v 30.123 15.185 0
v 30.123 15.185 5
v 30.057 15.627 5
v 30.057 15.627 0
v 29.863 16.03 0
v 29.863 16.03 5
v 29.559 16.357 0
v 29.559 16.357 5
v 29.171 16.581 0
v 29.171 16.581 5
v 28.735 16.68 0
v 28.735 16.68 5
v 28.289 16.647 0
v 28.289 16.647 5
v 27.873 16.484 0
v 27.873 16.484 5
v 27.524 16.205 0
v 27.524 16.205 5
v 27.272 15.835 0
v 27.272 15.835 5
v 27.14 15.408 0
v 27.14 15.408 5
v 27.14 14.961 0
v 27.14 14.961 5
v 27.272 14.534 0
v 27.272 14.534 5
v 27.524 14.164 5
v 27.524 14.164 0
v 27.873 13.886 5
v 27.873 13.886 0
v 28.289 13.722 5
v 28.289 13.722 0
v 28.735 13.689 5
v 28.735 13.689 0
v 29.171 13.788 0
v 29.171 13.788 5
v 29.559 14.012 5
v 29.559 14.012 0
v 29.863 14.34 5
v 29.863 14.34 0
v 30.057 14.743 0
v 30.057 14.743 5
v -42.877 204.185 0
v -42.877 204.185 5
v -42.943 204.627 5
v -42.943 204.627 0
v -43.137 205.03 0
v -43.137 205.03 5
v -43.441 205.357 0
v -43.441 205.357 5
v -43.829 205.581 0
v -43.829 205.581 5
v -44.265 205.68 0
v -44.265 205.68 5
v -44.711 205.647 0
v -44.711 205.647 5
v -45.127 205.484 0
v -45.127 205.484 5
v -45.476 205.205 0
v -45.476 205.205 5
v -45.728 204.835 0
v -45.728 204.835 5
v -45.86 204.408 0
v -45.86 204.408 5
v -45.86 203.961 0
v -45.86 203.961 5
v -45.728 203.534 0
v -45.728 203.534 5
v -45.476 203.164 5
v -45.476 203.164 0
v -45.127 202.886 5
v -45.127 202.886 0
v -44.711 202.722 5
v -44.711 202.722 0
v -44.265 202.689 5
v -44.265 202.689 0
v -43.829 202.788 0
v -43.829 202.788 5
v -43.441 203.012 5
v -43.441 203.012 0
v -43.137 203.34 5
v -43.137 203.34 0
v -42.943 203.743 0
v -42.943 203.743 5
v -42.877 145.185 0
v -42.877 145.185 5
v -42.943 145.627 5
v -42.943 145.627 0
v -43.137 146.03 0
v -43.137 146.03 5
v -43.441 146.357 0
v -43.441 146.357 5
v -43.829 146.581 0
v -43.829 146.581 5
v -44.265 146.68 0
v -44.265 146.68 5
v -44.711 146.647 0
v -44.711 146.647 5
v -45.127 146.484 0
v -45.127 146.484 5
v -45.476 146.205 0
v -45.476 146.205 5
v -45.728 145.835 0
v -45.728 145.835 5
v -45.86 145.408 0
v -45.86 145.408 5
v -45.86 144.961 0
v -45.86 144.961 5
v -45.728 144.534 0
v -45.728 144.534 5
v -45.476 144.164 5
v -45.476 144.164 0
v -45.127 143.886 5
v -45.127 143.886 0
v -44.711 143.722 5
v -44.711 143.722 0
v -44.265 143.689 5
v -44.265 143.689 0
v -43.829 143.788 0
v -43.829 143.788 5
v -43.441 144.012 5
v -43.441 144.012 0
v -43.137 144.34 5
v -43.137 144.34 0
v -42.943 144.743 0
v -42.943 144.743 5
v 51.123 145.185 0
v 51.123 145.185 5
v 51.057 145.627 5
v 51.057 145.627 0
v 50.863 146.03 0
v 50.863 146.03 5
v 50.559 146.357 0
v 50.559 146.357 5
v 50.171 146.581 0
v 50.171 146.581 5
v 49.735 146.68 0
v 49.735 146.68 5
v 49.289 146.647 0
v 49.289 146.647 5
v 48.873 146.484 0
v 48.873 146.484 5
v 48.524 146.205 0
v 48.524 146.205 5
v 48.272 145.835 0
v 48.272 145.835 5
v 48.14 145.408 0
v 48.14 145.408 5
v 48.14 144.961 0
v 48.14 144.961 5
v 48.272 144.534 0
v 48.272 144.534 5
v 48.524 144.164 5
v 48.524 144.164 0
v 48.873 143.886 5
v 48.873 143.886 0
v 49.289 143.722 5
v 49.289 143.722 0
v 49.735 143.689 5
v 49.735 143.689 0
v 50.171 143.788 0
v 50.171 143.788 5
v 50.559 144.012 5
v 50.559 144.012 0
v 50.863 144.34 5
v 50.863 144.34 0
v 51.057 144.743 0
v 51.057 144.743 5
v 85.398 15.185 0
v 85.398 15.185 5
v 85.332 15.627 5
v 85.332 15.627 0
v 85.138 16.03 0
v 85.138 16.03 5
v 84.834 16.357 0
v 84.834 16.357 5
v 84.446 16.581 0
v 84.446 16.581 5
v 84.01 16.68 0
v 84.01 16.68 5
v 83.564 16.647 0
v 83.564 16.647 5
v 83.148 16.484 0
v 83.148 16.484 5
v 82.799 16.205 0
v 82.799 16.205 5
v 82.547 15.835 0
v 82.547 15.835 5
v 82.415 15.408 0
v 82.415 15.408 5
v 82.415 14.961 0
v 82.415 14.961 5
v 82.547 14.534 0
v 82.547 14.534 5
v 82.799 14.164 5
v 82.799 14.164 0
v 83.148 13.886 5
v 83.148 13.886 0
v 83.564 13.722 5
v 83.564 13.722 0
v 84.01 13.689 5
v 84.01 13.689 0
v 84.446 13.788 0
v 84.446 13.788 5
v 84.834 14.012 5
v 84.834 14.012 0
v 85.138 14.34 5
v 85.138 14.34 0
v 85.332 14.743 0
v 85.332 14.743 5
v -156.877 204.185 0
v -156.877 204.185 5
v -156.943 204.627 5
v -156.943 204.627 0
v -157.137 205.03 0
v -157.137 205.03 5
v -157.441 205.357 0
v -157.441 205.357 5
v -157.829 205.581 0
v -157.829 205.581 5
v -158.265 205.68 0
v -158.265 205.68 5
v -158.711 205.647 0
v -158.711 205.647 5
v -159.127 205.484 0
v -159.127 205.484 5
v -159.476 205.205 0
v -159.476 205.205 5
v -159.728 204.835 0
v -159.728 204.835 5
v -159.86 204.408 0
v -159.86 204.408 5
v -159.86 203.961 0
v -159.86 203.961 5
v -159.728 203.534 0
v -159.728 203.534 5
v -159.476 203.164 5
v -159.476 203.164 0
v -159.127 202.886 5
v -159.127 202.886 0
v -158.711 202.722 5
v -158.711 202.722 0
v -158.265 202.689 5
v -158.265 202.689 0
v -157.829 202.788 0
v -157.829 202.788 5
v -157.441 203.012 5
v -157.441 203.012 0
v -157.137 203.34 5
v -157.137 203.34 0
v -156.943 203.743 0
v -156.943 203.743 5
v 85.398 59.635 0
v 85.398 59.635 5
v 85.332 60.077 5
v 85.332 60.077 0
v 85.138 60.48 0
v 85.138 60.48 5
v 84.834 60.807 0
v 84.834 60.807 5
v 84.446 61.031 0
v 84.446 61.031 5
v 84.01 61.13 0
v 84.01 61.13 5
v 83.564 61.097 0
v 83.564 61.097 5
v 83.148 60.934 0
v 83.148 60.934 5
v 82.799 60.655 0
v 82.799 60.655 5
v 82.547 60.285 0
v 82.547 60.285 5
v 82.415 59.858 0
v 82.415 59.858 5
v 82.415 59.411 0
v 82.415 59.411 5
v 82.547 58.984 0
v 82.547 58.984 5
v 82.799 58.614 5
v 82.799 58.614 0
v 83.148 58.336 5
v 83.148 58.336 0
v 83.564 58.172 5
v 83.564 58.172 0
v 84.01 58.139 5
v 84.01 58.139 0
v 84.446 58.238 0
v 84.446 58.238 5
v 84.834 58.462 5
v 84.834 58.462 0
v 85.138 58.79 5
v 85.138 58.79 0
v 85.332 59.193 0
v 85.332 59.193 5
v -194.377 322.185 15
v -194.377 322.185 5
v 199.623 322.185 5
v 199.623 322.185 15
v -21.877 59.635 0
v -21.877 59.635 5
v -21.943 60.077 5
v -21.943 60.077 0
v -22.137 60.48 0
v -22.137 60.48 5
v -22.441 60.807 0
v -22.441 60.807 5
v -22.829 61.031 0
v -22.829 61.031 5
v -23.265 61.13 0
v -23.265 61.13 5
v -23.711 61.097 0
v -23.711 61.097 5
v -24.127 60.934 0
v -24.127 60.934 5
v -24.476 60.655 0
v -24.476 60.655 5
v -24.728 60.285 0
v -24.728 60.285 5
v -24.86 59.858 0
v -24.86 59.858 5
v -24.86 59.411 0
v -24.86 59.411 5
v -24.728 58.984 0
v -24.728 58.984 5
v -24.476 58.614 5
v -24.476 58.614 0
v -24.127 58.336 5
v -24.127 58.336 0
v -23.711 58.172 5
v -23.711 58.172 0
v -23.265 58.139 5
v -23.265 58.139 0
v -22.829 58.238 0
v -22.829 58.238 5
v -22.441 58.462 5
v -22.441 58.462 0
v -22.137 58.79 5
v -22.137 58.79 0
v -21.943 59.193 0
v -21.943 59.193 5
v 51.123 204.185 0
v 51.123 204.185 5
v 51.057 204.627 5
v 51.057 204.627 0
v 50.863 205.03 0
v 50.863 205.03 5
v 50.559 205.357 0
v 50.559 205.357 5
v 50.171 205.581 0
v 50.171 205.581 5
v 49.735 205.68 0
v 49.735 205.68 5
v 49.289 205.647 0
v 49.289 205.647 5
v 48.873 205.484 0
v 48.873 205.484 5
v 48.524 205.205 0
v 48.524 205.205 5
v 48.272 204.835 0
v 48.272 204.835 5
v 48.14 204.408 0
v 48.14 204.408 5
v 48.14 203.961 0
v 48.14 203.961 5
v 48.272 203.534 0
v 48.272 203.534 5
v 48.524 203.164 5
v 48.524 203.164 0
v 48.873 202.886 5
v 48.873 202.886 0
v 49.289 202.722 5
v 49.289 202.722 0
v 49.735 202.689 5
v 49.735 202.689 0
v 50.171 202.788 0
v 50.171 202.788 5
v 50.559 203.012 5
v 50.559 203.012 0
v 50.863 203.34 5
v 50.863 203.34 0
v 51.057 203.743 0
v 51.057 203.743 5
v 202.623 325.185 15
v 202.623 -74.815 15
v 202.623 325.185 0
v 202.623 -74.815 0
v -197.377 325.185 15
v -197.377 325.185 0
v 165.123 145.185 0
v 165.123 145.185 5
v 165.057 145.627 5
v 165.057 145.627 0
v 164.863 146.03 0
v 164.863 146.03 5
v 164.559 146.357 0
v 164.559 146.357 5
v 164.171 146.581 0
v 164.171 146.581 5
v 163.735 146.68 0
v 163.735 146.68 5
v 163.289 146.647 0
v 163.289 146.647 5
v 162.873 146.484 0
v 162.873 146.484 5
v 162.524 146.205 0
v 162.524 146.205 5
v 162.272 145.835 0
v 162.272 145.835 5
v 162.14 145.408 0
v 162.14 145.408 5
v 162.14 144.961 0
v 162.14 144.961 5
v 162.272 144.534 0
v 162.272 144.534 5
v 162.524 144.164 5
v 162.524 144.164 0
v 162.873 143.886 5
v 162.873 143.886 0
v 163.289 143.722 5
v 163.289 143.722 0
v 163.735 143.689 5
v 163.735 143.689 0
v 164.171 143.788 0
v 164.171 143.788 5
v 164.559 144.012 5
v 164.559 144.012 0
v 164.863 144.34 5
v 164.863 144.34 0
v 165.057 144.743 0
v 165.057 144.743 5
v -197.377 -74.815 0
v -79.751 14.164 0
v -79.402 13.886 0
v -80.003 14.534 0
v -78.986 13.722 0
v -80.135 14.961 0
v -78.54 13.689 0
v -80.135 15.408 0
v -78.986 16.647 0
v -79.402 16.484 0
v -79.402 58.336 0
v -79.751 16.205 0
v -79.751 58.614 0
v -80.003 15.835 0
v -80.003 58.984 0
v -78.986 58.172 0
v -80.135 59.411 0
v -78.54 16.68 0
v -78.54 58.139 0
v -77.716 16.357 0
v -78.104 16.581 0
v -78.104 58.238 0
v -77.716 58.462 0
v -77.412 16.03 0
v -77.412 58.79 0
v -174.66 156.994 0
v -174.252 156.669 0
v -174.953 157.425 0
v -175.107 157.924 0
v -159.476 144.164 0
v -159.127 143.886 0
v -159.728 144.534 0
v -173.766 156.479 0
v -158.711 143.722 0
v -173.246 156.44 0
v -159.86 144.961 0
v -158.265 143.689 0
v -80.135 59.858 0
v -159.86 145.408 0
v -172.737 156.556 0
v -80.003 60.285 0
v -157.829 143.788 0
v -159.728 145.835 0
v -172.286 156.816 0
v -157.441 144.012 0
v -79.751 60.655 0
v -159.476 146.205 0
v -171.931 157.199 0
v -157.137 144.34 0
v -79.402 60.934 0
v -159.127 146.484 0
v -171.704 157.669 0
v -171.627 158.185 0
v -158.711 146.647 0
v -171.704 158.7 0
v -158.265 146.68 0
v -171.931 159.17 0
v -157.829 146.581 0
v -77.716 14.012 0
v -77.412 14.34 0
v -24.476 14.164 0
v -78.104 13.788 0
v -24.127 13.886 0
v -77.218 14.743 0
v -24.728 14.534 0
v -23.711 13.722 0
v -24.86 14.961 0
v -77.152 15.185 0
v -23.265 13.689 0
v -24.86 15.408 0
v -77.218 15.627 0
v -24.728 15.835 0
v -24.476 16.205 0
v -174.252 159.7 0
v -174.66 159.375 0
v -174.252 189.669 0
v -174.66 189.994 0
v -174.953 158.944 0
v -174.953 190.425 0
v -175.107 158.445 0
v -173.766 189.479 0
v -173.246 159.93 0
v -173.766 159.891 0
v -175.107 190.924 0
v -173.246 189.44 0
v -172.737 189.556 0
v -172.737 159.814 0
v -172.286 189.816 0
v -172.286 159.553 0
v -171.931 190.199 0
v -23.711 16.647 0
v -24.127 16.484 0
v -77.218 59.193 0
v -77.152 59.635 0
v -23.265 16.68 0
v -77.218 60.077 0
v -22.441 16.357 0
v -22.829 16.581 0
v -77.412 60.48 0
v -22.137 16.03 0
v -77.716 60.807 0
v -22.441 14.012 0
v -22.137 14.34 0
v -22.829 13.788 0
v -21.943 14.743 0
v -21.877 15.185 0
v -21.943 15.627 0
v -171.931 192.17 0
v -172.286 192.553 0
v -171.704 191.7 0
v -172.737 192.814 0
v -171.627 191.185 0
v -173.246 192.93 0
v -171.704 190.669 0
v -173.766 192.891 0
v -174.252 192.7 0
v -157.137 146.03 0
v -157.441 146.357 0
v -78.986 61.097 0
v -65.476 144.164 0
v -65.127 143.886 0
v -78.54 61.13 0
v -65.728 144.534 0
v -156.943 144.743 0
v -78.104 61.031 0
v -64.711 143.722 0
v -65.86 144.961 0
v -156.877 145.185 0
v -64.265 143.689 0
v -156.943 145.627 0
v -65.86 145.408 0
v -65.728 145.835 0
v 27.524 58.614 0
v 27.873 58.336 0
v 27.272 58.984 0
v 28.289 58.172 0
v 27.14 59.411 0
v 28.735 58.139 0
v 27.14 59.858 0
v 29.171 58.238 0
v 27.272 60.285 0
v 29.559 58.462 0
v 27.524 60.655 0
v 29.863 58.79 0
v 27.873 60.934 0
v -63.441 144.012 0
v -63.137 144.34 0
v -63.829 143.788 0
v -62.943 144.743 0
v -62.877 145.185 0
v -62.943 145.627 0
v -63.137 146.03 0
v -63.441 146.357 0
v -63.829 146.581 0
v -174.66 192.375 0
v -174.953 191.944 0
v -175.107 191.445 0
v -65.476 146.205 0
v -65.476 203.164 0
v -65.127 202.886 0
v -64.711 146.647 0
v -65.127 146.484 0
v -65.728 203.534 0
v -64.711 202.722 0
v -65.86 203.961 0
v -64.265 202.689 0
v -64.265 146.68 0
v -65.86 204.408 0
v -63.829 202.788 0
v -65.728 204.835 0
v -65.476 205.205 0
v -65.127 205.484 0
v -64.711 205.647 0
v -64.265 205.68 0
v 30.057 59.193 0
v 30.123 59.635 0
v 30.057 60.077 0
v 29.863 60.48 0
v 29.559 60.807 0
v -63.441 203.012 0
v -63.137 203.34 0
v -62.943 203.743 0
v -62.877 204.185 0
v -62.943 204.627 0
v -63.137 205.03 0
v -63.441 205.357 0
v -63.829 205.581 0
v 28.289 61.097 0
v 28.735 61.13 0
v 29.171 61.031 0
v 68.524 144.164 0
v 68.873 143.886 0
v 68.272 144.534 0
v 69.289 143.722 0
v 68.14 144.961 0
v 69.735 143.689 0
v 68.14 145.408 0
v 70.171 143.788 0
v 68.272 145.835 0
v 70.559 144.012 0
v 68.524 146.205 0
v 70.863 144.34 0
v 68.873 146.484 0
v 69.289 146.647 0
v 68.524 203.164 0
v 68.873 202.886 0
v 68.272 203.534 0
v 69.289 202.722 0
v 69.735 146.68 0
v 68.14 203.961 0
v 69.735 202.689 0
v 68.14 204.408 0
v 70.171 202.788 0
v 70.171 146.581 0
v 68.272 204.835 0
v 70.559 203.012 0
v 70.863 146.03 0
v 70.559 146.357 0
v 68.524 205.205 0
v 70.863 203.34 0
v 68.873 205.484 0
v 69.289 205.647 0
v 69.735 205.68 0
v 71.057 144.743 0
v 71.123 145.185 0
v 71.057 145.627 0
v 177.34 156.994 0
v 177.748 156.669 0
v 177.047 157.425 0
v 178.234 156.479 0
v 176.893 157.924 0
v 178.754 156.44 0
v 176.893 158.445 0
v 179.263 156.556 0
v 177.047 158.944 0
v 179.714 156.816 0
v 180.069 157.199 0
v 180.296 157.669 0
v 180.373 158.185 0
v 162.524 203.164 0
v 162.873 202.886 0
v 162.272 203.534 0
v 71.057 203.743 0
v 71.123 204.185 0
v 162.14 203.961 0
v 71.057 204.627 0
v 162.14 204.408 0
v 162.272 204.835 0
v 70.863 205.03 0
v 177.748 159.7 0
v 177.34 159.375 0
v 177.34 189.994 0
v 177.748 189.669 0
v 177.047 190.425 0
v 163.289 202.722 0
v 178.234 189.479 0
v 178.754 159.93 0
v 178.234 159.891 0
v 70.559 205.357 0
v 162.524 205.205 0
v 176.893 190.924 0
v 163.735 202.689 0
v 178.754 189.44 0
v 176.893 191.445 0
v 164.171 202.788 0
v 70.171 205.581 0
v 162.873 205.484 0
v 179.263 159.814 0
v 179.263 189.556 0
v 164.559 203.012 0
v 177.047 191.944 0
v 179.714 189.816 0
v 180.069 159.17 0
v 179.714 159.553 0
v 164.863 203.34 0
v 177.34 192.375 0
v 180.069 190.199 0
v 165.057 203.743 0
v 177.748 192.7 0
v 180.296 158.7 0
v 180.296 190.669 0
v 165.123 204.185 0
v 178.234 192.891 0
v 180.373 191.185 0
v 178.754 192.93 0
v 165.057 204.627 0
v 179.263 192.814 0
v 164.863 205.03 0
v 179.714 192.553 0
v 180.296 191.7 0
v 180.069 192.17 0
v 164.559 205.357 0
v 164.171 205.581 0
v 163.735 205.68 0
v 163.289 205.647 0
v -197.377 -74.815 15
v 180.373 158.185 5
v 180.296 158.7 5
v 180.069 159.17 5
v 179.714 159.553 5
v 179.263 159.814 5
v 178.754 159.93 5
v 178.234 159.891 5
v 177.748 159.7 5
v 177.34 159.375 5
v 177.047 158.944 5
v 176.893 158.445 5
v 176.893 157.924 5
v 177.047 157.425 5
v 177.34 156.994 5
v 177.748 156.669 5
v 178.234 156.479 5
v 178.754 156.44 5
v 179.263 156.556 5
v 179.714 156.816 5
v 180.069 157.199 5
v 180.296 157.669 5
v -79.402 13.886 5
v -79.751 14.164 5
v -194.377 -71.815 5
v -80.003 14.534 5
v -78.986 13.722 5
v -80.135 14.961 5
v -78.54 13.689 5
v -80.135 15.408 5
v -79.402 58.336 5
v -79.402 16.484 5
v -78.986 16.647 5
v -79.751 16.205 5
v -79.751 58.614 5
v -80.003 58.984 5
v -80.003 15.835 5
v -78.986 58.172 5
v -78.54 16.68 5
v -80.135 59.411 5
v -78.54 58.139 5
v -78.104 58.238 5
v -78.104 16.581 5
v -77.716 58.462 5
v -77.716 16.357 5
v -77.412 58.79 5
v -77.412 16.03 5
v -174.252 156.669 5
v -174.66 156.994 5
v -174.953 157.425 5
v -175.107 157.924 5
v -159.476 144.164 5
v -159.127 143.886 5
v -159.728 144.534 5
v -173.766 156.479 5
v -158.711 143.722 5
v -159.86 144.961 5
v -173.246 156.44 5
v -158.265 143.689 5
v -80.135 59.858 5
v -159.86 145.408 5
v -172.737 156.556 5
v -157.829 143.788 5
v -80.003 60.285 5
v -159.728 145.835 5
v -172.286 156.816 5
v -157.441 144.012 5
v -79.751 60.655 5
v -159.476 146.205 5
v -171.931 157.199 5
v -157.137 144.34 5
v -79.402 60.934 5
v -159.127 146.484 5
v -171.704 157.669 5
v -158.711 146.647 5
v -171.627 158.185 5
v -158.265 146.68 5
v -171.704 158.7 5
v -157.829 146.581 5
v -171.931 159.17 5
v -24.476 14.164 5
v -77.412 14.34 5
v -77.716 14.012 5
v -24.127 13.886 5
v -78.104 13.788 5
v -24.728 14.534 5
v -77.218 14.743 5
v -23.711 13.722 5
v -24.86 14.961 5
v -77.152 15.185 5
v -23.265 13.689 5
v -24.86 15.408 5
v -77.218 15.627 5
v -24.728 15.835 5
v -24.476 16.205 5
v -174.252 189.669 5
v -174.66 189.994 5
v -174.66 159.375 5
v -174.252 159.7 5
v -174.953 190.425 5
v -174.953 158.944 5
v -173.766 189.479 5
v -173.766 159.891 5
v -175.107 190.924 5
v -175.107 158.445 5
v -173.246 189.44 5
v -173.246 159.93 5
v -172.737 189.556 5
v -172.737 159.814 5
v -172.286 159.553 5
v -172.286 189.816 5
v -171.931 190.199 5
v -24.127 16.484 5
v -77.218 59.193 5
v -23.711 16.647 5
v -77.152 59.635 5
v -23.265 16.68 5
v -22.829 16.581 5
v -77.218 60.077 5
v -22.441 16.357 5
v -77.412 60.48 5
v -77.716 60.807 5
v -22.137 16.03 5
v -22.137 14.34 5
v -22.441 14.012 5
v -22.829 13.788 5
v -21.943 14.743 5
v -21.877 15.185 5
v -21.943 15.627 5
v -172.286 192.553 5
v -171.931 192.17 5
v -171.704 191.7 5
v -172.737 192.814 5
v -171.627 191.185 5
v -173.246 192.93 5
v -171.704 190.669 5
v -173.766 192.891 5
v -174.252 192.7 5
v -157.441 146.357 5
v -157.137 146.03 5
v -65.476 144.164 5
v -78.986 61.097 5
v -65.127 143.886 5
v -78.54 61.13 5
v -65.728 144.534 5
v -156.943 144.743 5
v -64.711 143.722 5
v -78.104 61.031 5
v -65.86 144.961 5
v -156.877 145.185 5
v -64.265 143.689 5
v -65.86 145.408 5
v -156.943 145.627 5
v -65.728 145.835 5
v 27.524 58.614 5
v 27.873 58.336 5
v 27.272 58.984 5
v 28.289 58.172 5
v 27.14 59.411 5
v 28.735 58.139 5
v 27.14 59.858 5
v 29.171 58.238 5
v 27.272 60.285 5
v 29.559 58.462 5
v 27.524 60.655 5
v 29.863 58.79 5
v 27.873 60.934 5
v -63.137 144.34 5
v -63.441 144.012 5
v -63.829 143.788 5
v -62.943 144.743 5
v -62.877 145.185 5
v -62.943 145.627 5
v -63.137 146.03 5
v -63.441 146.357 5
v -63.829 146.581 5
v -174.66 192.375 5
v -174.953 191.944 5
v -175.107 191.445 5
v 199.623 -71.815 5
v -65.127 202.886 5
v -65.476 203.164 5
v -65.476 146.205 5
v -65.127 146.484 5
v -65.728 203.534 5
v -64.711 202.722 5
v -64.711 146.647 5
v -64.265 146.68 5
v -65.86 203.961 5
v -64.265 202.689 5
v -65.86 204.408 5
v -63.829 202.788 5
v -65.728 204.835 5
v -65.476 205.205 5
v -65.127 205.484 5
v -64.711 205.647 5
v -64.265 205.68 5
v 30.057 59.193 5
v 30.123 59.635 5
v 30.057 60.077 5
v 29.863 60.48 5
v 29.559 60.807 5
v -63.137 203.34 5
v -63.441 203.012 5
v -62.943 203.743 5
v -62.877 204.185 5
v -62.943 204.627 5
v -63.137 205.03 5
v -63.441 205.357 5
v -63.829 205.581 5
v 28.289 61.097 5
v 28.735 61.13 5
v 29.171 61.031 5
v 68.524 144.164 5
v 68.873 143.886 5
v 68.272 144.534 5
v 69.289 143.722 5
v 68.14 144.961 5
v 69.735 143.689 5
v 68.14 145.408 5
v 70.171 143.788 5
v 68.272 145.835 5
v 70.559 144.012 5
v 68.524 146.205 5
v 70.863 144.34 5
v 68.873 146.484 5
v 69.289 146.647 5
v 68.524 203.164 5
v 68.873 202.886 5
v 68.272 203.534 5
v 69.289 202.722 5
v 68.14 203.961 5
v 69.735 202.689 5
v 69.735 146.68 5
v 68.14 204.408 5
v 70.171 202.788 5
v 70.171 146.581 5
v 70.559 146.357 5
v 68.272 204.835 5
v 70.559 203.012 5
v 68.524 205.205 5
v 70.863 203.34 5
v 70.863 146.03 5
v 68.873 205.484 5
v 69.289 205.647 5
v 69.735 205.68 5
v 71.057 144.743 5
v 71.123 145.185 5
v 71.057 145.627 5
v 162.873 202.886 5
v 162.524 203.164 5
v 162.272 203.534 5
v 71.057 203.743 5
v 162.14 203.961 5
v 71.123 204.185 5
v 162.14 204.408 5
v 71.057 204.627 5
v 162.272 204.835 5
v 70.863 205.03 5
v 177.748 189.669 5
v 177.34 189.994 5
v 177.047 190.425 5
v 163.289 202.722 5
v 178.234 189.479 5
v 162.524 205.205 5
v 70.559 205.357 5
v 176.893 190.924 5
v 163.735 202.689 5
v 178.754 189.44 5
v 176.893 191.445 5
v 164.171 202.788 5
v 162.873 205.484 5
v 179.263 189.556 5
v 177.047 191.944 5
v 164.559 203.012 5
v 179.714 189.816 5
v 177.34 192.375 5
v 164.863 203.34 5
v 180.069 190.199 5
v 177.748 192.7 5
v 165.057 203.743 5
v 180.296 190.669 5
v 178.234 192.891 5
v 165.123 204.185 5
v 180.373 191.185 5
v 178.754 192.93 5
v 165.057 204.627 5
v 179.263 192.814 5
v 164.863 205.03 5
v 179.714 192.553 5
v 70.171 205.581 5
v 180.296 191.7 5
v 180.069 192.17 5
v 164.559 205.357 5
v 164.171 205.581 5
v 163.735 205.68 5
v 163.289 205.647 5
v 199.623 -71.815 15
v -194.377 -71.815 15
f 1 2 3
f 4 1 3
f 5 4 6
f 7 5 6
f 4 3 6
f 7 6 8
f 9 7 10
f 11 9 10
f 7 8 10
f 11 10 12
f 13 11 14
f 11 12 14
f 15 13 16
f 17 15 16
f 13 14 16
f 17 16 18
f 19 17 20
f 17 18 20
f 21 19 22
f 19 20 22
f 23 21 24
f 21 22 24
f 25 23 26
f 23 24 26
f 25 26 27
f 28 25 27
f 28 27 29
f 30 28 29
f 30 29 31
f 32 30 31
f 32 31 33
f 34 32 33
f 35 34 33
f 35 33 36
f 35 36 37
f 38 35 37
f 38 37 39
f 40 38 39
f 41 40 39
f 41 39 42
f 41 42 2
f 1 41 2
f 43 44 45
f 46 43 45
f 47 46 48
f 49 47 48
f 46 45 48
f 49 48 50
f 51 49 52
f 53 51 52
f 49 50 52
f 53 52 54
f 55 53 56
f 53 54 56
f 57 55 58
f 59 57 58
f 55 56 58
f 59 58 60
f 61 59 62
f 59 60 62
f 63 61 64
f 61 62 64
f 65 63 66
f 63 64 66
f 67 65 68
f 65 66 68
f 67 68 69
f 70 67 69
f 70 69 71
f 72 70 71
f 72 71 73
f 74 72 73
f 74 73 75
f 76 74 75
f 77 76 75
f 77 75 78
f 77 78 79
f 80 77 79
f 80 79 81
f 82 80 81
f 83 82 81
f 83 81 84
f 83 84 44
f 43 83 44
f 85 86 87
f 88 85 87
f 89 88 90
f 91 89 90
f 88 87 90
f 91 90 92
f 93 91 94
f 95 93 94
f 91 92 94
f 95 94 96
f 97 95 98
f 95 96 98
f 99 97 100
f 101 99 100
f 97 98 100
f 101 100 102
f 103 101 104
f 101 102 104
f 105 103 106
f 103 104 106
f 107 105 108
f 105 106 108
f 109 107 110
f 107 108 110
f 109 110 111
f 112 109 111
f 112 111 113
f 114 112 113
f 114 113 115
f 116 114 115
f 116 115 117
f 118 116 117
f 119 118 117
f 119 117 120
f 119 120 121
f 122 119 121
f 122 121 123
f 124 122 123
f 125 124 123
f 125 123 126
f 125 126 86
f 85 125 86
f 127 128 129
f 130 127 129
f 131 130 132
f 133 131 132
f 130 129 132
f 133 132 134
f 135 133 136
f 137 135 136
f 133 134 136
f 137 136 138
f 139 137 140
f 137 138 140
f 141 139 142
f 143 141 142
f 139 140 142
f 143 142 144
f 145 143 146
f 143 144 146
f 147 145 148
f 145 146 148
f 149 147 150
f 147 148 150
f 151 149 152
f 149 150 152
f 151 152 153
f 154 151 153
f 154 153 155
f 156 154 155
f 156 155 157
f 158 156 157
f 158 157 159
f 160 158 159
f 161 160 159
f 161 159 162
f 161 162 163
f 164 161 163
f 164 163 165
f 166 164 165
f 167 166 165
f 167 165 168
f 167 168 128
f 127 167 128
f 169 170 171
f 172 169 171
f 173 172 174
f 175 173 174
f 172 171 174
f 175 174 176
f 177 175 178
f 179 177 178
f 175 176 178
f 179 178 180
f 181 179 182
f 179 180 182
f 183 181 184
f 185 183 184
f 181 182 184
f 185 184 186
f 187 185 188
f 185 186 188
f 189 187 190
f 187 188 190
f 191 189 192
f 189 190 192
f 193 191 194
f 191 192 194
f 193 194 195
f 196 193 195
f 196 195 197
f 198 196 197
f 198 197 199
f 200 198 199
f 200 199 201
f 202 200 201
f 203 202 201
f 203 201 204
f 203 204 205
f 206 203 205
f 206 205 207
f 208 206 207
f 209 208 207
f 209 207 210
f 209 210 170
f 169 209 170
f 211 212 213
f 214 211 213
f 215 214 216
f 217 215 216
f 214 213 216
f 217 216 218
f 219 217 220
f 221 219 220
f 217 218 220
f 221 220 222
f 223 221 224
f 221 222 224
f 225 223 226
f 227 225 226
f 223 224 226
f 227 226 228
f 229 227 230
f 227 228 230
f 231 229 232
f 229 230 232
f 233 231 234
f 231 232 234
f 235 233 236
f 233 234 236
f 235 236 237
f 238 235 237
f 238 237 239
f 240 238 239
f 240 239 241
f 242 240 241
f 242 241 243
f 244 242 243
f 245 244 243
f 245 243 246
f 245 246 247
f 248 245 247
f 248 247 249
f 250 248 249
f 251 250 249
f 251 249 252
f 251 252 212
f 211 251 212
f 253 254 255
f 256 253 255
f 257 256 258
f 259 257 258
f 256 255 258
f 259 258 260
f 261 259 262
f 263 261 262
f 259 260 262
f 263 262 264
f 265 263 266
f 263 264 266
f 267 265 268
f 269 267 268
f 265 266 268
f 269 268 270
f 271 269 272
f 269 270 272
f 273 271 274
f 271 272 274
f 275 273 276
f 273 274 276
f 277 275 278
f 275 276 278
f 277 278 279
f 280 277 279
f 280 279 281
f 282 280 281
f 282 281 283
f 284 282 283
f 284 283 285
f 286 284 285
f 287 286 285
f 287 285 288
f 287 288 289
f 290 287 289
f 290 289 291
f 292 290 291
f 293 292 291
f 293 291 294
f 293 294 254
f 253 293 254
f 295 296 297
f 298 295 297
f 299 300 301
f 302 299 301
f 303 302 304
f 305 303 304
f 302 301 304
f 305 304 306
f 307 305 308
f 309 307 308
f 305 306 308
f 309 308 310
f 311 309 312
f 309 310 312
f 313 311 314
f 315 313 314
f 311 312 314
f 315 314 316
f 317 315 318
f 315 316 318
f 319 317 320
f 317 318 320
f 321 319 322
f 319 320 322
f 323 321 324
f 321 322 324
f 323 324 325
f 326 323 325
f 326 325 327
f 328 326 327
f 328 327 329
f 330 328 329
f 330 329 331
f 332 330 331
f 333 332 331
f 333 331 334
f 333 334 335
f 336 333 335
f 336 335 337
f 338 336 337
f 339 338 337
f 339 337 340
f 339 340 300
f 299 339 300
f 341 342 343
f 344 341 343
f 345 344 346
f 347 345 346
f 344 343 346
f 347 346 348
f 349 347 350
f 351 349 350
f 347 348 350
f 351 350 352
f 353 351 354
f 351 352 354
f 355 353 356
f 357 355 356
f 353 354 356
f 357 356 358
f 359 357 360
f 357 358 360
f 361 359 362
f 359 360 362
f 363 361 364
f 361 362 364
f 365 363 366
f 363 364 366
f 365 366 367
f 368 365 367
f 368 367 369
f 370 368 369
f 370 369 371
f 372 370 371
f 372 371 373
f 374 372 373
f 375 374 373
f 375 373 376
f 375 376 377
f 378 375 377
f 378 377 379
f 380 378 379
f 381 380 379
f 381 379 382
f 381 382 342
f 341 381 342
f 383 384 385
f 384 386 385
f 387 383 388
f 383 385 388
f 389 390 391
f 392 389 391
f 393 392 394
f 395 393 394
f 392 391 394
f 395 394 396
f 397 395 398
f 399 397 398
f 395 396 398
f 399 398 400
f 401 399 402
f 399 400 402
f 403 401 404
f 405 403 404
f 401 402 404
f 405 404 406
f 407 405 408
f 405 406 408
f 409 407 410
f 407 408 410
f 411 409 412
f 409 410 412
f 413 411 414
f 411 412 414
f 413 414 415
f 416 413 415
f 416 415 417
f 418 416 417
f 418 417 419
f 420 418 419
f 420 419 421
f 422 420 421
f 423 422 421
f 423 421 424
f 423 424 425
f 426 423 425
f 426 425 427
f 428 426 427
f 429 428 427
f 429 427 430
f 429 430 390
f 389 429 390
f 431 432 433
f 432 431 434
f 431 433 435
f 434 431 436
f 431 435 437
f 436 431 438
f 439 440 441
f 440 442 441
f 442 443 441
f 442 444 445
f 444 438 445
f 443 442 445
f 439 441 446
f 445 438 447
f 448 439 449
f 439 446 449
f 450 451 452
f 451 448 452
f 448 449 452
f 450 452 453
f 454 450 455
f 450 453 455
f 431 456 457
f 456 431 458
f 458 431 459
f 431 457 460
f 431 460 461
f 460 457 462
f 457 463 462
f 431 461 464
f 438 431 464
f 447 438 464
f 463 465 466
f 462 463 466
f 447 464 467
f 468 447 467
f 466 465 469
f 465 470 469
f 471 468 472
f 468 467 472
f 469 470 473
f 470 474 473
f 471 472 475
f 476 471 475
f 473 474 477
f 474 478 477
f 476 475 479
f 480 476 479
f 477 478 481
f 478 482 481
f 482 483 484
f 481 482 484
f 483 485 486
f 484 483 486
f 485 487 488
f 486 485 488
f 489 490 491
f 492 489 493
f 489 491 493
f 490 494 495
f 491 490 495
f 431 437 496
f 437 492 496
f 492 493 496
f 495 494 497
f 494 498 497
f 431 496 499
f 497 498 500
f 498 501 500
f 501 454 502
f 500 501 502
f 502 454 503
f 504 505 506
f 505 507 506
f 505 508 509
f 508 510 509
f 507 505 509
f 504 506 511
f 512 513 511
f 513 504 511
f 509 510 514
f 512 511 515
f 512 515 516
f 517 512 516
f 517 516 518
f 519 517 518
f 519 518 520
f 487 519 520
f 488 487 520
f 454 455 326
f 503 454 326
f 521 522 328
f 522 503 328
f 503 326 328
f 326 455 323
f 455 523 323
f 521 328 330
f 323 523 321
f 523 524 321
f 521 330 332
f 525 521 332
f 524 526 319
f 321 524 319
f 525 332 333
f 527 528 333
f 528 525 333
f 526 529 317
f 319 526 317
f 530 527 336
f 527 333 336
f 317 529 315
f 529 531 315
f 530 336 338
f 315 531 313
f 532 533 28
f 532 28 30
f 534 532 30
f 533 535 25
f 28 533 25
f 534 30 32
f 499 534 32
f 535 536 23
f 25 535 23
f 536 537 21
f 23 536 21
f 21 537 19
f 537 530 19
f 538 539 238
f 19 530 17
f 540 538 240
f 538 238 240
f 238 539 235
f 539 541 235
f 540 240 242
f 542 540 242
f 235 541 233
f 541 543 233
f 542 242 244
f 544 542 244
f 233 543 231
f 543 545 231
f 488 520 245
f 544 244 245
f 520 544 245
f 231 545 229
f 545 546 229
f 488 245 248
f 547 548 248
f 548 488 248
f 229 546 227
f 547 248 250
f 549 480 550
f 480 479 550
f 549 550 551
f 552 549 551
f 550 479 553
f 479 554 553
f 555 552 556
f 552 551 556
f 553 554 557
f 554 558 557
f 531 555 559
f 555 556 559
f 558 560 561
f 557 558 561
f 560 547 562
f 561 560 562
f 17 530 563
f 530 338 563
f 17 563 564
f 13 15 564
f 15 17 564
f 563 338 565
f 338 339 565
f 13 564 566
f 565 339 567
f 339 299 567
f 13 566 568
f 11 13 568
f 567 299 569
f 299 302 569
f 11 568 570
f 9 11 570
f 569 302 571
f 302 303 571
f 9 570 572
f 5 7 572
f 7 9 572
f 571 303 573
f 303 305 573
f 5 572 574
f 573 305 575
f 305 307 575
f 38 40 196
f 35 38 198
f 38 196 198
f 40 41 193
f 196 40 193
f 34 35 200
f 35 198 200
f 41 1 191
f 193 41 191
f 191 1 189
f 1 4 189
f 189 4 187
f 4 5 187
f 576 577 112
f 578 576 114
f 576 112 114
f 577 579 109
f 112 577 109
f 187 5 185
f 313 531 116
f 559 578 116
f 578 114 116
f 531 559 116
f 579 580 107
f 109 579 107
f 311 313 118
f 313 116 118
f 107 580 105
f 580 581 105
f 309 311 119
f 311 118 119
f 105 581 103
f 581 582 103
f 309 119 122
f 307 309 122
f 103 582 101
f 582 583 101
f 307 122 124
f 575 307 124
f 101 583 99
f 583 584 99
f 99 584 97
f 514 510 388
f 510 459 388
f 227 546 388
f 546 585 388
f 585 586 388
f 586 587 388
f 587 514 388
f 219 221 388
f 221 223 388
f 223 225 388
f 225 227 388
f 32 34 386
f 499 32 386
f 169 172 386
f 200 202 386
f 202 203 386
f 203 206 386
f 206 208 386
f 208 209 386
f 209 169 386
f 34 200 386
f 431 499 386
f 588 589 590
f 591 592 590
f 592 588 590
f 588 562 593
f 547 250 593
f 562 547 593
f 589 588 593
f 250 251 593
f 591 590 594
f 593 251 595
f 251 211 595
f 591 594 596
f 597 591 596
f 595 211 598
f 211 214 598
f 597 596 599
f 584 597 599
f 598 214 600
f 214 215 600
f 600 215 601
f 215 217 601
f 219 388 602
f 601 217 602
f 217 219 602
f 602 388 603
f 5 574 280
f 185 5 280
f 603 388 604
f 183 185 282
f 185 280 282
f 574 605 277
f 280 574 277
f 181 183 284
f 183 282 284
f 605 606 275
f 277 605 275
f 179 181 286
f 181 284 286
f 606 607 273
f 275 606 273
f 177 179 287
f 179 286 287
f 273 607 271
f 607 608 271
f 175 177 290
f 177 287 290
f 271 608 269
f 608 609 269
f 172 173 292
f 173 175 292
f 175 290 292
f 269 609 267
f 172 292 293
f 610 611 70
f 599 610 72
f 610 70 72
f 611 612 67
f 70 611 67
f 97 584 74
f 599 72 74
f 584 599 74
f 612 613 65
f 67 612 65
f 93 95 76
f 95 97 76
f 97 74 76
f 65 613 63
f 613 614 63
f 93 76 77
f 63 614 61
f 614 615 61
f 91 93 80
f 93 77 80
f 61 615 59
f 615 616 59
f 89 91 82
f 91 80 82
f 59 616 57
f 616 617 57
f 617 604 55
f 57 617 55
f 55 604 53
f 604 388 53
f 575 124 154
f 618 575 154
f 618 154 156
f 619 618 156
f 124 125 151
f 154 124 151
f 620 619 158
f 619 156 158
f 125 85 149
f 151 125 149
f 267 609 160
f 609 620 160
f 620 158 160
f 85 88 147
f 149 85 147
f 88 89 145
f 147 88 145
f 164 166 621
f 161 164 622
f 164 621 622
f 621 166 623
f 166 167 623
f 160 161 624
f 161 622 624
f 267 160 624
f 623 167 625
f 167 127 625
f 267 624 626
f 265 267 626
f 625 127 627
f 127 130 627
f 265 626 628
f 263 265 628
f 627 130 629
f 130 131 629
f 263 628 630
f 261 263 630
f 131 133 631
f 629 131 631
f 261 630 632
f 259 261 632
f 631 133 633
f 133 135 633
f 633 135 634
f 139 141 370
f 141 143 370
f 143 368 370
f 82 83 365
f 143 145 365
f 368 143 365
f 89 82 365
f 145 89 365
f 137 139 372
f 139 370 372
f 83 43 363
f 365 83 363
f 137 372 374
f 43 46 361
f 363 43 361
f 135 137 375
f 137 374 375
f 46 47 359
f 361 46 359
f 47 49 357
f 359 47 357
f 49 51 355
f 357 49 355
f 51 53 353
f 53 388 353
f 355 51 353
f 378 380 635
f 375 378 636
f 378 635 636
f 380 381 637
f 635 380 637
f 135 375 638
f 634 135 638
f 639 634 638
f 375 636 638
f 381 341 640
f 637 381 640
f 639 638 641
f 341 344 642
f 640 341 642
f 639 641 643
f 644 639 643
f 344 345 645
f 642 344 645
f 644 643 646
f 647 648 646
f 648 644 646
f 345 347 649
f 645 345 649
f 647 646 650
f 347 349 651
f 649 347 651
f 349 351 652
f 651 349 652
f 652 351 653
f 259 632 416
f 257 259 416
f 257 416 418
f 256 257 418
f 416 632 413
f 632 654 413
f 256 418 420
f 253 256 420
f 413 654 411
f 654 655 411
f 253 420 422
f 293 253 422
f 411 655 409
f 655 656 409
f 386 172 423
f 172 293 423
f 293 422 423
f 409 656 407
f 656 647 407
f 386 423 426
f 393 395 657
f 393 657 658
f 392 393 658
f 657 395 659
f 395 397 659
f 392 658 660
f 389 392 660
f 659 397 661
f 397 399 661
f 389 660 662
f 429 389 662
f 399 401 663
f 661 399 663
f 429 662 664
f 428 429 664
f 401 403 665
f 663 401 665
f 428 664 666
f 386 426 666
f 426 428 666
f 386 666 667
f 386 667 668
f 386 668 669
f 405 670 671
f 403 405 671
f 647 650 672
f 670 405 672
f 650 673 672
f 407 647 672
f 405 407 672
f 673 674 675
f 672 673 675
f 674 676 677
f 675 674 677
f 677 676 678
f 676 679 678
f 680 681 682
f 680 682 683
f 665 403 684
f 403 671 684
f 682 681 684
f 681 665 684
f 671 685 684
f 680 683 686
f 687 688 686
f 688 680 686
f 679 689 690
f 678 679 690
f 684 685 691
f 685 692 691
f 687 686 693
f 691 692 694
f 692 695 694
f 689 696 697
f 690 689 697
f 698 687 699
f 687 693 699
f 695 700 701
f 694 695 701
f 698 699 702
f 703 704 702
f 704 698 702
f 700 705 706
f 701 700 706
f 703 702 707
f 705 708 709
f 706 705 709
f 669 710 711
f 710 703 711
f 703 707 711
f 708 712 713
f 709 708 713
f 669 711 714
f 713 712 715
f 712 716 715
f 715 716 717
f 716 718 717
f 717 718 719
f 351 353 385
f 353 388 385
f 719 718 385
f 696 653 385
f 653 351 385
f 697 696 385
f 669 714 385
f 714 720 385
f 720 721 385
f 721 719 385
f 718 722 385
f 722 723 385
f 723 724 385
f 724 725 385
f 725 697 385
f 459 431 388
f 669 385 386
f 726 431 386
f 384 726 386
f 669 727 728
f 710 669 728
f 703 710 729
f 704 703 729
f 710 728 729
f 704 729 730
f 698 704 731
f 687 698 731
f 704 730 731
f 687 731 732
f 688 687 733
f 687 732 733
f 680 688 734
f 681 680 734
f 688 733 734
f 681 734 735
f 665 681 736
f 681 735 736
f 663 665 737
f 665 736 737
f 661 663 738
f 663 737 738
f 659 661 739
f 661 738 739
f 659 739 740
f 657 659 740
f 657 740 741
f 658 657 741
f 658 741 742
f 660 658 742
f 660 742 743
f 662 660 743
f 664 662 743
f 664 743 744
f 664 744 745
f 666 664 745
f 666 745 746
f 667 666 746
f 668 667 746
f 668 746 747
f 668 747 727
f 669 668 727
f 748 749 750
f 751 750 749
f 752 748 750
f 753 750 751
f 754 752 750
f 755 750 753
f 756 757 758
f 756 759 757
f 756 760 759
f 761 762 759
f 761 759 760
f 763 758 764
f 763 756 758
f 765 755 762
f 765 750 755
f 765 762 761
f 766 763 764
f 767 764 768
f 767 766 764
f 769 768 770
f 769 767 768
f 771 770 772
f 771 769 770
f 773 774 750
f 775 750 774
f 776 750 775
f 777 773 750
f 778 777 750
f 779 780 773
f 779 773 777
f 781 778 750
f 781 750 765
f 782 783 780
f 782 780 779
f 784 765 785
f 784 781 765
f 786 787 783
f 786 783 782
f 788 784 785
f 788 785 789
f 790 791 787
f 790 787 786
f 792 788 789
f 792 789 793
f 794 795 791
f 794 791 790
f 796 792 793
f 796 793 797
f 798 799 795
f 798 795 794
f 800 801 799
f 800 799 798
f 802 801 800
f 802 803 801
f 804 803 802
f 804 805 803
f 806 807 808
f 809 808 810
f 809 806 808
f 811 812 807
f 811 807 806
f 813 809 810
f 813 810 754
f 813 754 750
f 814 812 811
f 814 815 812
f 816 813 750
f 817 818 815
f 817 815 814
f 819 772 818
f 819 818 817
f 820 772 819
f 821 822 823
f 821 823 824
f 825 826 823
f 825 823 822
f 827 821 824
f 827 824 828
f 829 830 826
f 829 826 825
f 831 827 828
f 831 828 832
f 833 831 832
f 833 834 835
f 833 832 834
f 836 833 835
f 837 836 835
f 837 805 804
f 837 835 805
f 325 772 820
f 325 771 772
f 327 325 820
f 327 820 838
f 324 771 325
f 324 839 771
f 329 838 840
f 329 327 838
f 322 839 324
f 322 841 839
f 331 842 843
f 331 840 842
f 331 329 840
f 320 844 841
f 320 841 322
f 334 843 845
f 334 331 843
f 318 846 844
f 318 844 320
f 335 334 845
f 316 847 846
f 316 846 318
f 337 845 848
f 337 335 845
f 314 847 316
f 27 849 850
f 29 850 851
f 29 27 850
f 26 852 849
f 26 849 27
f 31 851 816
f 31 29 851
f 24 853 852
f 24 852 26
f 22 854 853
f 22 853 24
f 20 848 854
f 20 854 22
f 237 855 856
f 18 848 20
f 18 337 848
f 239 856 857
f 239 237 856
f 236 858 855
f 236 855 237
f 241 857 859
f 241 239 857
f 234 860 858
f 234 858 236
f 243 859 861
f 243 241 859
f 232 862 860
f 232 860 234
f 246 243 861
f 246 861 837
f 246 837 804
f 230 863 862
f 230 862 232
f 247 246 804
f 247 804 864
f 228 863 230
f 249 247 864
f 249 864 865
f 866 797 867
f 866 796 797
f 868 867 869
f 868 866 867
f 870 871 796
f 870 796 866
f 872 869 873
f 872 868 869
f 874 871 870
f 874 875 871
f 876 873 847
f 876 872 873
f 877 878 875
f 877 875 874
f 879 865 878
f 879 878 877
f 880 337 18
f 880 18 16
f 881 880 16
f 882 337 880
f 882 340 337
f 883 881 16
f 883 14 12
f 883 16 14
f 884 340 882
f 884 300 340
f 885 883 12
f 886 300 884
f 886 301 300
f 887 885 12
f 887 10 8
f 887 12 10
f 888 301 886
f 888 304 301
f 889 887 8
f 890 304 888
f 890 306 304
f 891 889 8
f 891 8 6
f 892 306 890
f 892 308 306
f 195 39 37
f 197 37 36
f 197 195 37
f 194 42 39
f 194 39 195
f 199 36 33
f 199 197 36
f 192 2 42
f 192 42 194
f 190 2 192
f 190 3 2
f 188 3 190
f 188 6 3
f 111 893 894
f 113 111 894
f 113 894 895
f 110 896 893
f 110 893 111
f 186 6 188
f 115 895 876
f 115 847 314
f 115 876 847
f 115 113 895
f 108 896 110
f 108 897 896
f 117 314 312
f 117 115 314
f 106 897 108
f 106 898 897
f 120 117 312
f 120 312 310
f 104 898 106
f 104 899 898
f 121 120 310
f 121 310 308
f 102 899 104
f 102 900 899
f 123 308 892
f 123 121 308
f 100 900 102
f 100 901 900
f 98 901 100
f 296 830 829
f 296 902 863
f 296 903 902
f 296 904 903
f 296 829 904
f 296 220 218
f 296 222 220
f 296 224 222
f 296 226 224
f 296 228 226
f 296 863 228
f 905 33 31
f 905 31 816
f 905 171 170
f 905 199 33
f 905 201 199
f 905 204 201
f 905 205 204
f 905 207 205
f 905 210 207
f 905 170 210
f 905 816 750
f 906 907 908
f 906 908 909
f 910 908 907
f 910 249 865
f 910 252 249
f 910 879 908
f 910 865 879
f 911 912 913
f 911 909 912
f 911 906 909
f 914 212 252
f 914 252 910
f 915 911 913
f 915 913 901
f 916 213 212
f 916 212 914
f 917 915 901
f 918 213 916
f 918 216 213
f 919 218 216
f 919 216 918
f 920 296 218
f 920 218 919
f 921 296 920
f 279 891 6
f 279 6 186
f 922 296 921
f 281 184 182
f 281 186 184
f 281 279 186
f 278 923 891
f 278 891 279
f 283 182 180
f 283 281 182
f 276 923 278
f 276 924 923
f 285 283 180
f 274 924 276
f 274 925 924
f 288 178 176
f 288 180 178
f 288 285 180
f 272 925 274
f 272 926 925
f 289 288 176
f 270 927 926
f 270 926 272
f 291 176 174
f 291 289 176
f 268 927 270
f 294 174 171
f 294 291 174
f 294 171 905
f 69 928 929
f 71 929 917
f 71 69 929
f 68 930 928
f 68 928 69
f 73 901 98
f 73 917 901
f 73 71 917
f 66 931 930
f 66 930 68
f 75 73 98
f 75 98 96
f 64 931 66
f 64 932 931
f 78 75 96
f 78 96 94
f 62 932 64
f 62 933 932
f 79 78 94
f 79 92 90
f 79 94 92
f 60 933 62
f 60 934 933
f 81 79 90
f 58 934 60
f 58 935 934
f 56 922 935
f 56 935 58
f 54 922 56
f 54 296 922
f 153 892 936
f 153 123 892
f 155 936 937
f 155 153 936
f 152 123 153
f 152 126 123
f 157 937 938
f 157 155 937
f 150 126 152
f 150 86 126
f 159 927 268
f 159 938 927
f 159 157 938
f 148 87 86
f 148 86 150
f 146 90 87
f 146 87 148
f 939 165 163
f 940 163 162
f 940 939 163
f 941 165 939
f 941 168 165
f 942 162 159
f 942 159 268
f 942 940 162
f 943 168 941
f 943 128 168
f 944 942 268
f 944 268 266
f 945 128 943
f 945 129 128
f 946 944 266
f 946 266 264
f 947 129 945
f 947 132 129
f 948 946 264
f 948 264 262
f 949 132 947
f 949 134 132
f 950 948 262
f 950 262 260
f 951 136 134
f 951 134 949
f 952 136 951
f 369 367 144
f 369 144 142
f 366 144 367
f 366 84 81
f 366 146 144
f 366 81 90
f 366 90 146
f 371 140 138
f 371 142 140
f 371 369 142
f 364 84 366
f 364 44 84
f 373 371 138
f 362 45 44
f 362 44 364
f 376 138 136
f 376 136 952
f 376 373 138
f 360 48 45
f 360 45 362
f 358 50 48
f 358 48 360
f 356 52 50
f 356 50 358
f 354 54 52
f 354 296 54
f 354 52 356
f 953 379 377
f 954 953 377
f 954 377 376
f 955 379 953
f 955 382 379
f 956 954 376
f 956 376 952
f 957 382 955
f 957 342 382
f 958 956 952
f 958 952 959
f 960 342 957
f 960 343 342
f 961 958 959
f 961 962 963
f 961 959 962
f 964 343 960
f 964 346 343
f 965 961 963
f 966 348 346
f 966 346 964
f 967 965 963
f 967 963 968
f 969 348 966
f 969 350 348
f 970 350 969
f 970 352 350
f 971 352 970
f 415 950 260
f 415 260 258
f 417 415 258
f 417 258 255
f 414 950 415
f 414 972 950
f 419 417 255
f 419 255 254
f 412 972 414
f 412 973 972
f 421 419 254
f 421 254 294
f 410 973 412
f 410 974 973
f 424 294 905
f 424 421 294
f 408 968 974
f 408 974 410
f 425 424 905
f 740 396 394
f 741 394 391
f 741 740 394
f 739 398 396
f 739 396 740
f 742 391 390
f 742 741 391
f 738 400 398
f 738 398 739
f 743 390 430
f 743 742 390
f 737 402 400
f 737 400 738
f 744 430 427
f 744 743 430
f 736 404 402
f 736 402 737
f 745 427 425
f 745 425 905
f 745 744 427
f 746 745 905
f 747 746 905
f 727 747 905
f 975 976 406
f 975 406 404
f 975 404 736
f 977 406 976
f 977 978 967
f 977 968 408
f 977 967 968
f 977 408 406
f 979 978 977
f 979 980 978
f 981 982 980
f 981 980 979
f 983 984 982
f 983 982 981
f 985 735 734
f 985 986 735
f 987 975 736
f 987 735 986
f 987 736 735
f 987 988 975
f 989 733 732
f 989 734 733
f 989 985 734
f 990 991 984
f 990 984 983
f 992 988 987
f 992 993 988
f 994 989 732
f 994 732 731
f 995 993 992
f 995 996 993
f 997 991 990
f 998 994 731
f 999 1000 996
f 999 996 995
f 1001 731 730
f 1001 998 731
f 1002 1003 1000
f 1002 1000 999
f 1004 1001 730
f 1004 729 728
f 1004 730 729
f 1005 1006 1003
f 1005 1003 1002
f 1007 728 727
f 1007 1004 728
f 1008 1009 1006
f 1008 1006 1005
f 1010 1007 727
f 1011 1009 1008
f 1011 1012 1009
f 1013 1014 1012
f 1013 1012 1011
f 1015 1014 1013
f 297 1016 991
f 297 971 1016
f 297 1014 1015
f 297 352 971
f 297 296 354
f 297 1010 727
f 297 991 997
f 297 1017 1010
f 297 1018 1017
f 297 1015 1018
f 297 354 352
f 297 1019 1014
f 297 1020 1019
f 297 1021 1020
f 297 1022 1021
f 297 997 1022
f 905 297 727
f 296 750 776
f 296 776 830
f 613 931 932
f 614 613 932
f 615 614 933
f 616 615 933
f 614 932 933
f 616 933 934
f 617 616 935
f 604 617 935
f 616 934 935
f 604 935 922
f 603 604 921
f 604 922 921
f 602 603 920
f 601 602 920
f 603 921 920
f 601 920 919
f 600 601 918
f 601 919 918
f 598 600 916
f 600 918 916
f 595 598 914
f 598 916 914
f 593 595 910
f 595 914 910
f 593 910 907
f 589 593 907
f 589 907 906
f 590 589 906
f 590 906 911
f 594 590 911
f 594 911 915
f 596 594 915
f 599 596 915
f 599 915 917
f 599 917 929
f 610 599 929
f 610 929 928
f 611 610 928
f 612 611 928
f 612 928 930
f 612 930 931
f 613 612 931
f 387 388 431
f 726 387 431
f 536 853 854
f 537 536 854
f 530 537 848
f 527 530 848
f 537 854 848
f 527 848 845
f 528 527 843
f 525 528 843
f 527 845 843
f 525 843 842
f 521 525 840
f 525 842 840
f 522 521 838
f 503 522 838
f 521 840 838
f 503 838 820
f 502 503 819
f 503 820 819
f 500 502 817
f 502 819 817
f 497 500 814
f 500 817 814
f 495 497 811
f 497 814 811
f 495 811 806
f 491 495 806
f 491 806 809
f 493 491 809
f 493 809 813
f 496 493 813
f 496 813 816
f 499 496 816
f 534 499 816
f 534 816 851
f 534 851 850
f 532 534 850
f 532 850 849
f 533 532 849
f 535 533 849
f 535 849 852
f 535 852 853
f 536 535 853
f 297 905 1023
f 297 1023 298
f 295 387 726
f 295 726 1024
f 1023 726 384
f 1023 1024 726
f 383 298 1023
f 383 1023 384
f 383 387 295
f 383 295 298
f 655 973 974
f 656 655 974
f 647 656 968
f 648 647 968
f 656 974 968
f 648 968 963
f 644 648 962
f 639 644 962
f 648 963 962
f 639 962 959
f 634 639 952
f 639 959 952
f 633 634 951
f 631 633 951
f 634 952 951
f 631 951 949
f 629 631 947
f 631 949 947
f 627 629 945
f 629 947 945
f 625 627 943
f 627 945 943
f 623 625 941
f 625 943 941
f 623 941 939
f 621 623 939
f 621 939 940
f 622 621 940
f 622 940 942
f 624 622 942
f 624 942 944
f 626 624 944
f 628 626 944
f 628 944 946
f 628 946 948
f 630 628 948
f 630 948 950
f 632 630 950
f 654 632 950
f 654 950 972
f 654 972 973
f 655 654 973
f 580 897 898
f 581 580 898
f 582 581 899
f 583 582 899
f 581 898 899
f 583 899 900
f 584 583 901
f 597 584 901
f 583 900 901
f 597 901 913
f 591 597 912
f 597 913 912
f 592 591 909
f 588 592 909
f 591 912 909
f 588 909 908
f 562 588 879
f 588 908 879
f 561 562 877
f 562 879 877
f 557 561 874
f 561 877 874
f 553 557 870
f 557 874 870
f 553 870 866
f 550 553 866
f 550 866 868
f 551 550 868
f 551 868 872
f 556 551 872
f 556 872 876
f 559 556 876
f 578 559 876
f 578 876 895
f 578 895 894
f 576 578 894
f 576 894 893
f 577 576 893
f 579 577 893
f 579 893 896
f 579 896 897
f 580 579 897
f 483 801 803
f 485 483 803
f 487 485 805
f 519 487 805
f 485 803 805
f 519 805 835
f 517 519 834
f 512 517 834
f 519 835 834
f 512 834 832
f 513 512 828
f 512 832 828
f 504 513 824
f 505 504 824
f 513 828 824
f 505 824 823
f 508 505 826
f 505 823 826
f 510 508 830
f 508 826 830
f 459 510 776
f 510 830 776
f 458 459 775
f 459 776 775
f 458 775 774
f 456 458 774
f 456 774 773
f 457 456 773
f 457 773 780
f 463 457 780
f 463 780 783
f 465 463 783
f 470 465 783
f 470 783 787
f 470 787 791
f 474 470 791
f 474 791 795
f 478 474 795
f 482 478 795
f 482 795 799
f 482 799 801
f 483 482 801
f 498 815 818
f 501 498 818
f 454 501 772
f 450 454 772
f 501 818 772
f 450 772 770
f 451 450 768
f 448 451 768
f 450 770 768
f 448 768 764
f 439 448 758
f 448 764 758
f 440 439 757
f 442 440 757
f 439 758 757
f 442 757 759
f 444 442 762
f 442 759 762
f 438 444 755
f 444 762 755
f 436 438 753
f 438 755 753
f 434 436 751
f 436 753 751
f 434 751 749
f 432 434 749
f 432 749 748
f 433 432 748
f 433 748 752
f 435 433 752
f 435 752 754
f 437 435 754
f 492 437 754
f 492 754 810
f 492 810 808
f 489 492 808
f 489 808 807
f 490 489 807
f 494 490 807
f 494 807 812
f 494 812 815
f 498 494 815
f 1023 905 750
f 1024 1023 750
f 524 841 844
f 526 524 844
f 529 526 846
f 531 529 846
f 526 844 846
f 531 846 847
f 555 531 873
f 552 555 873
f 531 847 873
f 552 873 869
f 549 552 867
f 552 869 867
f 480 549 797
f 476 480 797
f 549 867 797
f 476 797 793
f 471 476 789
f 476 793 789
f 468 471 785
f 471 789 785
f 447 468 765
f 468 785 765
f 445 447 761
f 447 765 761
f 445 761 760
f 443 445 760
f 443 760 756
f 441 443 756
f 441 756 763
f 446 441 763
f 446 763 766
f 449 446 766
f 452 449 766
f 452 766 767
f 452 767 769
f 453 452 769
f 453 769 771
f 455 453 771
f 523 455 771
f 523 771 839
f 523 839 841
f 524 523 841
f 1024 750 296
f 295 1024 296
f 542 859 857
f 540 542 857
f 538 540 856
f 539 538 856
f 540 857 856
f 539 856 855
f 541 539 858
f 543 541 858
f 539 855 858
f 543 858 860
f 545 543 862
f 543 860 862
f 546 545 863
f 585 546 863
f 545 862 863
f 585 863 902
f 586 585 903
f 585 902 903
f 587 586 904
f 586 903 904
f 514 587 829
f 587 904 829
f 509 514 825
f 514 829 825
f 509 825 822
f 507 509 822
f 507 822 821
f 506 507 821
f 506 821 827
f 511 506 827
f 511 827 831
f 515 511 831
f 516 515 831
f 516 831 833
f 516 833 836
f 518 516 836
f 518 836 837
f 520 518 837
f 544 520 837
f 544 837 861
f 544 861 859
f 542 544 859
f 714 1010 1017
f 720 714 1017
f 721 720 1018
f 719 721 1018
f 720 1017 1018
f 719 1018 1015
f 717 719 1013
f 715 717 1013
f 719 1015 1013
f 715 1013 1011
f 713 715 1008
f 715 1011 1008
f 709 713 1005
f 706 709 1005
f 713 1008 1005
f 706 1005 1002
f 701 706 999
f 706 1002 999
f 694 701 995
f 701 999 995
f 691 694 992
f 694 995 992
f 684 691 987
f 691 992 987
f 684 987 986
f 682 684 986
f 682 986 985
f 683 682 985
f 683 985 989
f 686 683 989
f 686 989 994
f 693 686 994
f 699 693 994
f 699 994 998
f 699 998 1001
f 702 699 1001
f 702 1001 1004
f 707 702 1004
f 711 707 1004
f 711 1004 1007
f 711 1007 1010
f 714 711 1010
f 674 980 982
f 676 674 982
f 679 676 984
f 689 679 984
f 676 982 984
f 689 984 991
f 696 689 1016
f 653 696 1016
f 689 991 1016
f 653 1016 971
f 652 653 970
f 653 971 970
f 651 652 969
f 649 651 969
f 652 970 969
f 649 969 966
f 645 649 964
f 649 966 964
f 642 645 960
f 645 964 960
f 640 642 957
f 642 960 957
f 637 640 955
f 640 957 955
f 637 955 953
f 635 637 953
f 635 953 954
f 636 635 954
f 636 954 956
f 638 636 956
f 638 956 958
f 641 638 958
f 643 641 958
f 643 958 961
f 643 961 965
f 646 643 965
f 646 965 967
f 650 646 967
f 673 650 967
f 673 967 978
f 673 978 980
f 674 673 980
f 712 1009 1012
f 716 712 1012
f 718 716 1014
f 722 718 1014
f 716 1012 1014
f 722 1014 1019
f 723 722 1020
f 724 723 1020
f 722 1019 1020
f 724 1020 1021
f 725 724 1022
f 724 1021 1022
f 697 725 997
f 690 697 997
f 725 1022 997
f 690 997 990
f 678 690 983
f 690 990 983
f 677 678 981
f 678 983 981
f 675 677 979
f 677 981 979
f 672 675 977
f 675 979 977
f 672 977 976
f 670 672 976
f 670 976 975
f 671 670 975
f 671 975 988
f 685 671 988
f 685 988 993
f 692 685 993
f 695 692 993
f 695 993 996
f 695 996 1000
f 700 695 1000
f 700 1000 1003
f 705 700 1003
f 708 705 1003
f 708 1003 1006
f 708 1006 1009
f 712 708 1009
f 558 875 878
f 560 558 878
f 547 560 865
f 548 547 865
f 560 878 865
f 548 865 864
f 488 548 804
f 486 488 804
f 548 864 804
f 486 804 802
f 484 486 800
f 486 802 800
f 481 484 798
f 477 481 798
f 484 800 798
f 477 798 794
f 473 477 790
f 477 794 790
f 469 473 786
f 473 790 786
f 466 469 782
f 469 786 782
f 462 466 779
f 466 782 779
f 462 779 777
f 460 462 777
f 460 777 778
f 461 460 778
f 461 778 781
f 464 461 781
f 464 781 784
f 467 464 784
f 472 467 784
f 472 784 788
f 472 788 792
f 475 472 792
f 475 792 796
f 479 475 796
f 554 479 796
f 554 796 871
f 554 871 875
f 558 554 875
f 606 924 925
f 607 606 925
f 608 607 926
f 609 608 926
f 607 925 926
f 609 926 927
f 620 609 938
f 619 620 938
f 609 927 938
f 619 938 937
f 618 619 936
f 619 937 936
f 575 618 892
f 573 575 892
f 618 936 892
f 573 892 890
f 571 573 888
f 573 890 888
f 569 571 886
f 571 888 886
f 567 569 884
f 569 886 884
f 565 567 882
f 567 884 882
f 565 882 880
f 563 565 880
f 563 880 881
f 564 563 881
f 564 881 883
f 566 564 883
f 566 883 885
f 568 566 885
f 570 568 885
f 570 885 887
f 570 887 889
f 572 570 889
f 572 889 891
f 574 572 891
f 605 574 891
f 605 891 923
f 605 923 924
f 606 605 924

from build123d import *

# Parameters (mm, degrees)
F0_W      = 400
F0_H      = 400
F1_DEPTH  = 5
F2_R      = 1.5
F2_R_2    = 1.75
F3_DEPTH  = 5.001
F4_R      = 1.5
F5_DEPTH  = 5.001
F6_R      = 1.5
F7_DEPTH  = 5.001
F9_W      = 3
F9_H      = 394
F10_DEPTH = 10
F11_W     = 30
F11_H     = 15
F12_DEPTH = 3
F13_W     = 30
F13_H     = 15
F14_DEPTH = 3


with BuildPart() as f1:
    # F0 (on Top) → F1 (new body)
    with BuildSketch(Plane.XY):
        with Locations((2.6232805103, 125.1846492136)):
            Rectangle(F0_W, F0_H)
    extrude(amount=F1_DEPTH)

    # F2 (on face) → F3 (cut, through all)
    with BuildSketch(Plane.XY.offset(5)):
        with Locations((-158.3767194897, 145.1846492136)):
            Circle(F2_R)
        with Locations((-64.3767194897, 145.1846492136)):
            Circle(F2_R)
        with Locations((-44.3767194897, 145.1846492136)):
            Circle(F2_R)
        with Locations((49.6232805103, 145.1846492136)):
            Circle(F2_R)
        with Locations((69.6232805103, 145.1846492136)):
            Circle(F2_R)
        with Locations((163.6232805103, 145.1846492136)):
            Circle(F2_R)
        with Locations((-44.3767194897, 204.1846492136)):
            Circle(F2_R)
        with Locations((-158.3767194897, 204.1846492136)):
            Circle(F2_R)
        with Locations((49.6232805103, 204.1846492136)):
            Circle(F2_R)
        with Locations((69.6232805103, 204.1846492136)):
            Circle(F2_R)
        with Locations((163.6232805103, 204.1846492136)):
            Circle(F2_R)
        with Locations((-64.3767194897, 204.1846492136)):
            Circle(F2_R)
        with Locations((-173.3767194897, 158.1846492136)):
            Circle(F2_R_2)
        with Locations((-173.3767194897, 191.1846492136)):
            Circle(F2_R_2)
        with Locations((178.6232805103, 158.1846492136)):
            Circle(F2_R_2)
        with Locations((178.6232805103, 191.1846492136)):
            Circle(F2_R_2)
    extrude(amount=-F3_DEPTH, mode=Mode.SUBTRACT)

    # F4 (on face) → F5 (cut, through all)
    with BuildSketch(Plane.XY.offset(5)):
        with Locations((-23.3767194897, 15.1846492136)):
            Circle(F4_R)
        with Locations((-23.3767194897, 59.6346492136)):
            Circle(F4_R)
        with Locations((28.6232805103, 15.1846492136)):
            Circle(F4_R)
        with Locations((28.6232805103, 59.6346492136)):
            Circle(F4_R)
    extrude(amount=-F5_DEPTH, mode=Mode.SUBTRACT)

    # F6 (on face) → F7 (cut, through all)
    with BuildSketch(Plane.XY.offset(5)):
        with Locations((-78.6517194897, 15.1846492136)):
            Circle(F6_R)
        with Locations((-78.6517194897, 59.6346492136)):
            Circle(F6_R)
        with Locations((83.8982805103, 15.1846492136)):
            Circle(F6_R)
        with Locations((83.8982805103, 59.6346492136)):
            Circle(F6_R)
    extrude(amount=-F7_DEPTH, mode=Mode.SUBTRACT)

    # F9 (on face) → F10 (join)
    with BuildSketch(Plane.XY.offset(5)):
        Polygon((-197.3767194897, -71.8153507864), (-197.3767194897, -74.8153507864), (202.6232805103, -74.8153507864), (202.6232805103, -71.8153507864), (199.6232805103, -71.8153507864), (-194.3767194897, -71.8153507864), align=None)
        Polygon((-197.3767194897, 325.1846492136), (-197.3767194897, -71.8153507864), (-194.3767194897, -71.8153507864), (-194.3767194897, 322.1846492136), (-194.3767194897, 325.1846492136), align=None)
        with Locations((201.1232805103, 125.1846492136)):
            Rectangle(F9_W, F9_H)
        Polygon((199.6232805103, 322.1846492136), (202.6232805103, 322.1846492136), (202.6232805103, 325.1846492136), (-194.3767194897, 325.1846492136), (-194.3767194897, 322.1846492136), align=None)
    extrude(amount=F10_DEPTH)

    # F11 (on face) → F12 (cut, through all)
    with BuildSketch(Plane.XZ.offset(74.8153507864)):
        with Locations((0, 22.5)):
            Rectangle(F11_W, F11_H)
    extrude(amount=-F12_DEPTH, mode=Mode.SUBTRACT)

    # F13 (on face) → F14 (cut, through all)
    with BuildSketch(Plane(origin=(0, 325.1846492136, 0), x_dir=(-1, 0, 0), z_dir=(0, 1, 0))):
        with Locations((0, 22.5)):
            Rectangle(F13_W, F13_H)
    extrude(amount=-F14_DEPTH, mode=Mode.SUBTRACT)


solid = f1.part
